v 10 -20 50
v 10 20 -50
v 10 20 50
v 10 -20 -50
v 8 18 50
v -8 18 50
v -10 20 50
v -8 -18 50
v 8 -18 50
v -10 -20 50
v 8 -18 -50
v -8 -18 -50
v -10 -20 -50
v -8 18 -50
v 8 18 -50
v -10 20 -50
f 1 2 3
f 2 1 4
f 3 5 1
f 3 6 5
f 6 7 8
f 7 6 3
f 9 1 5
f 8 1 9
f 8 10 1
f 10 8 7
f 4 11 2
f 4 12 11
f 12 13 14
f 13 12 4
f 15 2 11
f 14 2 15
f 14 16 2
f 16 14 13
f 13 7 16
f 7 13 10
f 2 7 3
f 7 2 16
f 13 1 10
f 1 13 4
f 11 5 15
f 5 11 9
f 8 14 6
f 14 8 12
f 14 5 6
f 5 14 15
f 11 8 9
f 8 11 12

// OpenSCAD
module aluminium_extrusion() {
    difference() {
        cube([20, 40, 100], center = true);
        translate([-8, -18, -50])
            cube([16, 36, 100], center = false);
    }
}

aluminium_extrusion();
